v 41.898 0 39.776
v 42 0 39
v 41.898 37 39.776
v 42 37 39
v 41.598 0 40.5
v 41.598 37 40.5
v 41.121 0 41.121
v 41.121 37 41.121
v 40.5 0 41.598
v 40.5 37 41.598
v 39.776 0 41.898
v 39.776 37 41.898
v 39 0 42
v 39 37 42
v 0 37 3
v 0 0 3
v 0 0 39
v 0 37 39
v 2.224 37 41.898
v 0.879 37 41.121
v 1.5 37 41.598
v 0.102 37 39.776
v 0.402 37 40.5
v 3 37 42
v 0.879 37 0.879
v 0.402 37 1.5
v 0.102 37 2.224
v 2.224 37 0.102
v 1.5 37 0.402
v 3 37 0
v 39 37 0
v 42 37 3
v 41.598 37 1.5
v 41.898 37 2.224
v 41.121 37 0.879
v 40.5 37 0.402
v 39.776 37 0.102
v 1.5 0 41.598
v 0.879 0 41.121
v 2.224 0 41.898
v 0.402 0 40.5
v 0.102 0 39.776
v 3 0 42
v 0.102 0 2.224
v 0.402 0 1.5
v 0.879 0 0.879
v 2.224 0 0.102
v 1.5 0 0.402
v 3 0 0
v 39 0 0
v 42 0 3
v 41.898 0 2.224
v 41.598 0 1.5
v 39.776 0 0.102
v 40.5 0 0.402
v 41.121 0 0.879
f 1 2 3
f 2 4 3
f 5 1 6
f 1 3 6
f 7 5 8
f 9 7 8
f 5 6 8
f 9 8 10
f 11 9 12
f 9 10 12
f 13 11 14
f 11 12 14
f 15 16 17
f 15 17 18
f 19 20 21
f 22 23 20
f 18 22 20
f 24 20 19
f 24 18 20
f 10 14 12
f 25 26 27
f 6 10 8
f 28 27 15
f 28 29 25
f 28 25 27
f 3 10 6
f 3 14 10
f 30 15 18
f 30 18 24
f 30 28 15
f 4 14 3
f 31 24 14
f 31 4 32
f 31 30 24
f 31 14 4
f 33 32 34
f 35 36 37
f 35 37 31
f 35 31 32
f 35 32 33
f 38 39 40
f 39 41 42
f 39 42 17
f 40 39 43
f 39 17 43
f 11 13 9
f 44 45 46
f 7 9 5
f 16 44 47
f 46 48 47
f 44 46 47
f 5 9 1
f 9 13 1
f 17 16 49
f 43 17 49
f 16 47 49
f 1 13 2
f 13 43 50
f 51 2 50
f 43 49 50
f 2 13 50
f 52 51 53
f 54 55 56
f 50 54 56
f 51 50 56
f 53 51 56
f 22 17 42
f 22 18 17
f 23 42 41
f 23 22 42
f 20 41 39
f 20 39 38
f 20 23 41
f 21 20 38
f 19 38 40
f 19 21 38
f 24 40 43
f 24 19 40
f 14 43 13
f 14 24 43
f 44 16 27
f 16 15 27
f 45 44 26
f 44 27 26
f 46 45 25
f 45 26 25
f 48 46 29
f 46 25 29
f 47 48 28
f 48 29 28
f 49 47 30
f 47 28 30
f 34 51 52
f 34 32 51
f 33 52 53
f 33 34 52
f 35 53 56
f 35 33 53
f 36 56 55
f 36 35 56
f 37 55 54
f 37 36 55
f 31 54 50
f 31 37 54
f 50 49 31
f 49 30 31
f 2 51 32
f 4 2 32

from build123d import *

# Parameters (mm, degrees)
SKETCH_1_W         = 42
SKETCH_1_H         = 37
BLOCKEXTRUDE_DEPTH = 42
FILLET_2_R         = 3


with BuildPart() as part:
    # 草图1 → BlockExtrude (new body)
    with BuildSketch(Plane.XY):
        with Locations((21, 18.5)):
            Rectangle(SKETCH_1_W, SKETCH_1_H)
    extrude(amount=BLOCKEXTRUDE_DEPTH)

    # Fillet 2
    fillet_2_edges = [part.edges().sort_by_distance(p)[0] for p in [
        (42, 18.5, 42),
        (0, 18.5, 42),
        (42, 18.5, 0),
        (0, 18.5, 0),
    ]]
    fillet(fillet_2_edges, radius=FILLET_2_R)


solid = part.part
